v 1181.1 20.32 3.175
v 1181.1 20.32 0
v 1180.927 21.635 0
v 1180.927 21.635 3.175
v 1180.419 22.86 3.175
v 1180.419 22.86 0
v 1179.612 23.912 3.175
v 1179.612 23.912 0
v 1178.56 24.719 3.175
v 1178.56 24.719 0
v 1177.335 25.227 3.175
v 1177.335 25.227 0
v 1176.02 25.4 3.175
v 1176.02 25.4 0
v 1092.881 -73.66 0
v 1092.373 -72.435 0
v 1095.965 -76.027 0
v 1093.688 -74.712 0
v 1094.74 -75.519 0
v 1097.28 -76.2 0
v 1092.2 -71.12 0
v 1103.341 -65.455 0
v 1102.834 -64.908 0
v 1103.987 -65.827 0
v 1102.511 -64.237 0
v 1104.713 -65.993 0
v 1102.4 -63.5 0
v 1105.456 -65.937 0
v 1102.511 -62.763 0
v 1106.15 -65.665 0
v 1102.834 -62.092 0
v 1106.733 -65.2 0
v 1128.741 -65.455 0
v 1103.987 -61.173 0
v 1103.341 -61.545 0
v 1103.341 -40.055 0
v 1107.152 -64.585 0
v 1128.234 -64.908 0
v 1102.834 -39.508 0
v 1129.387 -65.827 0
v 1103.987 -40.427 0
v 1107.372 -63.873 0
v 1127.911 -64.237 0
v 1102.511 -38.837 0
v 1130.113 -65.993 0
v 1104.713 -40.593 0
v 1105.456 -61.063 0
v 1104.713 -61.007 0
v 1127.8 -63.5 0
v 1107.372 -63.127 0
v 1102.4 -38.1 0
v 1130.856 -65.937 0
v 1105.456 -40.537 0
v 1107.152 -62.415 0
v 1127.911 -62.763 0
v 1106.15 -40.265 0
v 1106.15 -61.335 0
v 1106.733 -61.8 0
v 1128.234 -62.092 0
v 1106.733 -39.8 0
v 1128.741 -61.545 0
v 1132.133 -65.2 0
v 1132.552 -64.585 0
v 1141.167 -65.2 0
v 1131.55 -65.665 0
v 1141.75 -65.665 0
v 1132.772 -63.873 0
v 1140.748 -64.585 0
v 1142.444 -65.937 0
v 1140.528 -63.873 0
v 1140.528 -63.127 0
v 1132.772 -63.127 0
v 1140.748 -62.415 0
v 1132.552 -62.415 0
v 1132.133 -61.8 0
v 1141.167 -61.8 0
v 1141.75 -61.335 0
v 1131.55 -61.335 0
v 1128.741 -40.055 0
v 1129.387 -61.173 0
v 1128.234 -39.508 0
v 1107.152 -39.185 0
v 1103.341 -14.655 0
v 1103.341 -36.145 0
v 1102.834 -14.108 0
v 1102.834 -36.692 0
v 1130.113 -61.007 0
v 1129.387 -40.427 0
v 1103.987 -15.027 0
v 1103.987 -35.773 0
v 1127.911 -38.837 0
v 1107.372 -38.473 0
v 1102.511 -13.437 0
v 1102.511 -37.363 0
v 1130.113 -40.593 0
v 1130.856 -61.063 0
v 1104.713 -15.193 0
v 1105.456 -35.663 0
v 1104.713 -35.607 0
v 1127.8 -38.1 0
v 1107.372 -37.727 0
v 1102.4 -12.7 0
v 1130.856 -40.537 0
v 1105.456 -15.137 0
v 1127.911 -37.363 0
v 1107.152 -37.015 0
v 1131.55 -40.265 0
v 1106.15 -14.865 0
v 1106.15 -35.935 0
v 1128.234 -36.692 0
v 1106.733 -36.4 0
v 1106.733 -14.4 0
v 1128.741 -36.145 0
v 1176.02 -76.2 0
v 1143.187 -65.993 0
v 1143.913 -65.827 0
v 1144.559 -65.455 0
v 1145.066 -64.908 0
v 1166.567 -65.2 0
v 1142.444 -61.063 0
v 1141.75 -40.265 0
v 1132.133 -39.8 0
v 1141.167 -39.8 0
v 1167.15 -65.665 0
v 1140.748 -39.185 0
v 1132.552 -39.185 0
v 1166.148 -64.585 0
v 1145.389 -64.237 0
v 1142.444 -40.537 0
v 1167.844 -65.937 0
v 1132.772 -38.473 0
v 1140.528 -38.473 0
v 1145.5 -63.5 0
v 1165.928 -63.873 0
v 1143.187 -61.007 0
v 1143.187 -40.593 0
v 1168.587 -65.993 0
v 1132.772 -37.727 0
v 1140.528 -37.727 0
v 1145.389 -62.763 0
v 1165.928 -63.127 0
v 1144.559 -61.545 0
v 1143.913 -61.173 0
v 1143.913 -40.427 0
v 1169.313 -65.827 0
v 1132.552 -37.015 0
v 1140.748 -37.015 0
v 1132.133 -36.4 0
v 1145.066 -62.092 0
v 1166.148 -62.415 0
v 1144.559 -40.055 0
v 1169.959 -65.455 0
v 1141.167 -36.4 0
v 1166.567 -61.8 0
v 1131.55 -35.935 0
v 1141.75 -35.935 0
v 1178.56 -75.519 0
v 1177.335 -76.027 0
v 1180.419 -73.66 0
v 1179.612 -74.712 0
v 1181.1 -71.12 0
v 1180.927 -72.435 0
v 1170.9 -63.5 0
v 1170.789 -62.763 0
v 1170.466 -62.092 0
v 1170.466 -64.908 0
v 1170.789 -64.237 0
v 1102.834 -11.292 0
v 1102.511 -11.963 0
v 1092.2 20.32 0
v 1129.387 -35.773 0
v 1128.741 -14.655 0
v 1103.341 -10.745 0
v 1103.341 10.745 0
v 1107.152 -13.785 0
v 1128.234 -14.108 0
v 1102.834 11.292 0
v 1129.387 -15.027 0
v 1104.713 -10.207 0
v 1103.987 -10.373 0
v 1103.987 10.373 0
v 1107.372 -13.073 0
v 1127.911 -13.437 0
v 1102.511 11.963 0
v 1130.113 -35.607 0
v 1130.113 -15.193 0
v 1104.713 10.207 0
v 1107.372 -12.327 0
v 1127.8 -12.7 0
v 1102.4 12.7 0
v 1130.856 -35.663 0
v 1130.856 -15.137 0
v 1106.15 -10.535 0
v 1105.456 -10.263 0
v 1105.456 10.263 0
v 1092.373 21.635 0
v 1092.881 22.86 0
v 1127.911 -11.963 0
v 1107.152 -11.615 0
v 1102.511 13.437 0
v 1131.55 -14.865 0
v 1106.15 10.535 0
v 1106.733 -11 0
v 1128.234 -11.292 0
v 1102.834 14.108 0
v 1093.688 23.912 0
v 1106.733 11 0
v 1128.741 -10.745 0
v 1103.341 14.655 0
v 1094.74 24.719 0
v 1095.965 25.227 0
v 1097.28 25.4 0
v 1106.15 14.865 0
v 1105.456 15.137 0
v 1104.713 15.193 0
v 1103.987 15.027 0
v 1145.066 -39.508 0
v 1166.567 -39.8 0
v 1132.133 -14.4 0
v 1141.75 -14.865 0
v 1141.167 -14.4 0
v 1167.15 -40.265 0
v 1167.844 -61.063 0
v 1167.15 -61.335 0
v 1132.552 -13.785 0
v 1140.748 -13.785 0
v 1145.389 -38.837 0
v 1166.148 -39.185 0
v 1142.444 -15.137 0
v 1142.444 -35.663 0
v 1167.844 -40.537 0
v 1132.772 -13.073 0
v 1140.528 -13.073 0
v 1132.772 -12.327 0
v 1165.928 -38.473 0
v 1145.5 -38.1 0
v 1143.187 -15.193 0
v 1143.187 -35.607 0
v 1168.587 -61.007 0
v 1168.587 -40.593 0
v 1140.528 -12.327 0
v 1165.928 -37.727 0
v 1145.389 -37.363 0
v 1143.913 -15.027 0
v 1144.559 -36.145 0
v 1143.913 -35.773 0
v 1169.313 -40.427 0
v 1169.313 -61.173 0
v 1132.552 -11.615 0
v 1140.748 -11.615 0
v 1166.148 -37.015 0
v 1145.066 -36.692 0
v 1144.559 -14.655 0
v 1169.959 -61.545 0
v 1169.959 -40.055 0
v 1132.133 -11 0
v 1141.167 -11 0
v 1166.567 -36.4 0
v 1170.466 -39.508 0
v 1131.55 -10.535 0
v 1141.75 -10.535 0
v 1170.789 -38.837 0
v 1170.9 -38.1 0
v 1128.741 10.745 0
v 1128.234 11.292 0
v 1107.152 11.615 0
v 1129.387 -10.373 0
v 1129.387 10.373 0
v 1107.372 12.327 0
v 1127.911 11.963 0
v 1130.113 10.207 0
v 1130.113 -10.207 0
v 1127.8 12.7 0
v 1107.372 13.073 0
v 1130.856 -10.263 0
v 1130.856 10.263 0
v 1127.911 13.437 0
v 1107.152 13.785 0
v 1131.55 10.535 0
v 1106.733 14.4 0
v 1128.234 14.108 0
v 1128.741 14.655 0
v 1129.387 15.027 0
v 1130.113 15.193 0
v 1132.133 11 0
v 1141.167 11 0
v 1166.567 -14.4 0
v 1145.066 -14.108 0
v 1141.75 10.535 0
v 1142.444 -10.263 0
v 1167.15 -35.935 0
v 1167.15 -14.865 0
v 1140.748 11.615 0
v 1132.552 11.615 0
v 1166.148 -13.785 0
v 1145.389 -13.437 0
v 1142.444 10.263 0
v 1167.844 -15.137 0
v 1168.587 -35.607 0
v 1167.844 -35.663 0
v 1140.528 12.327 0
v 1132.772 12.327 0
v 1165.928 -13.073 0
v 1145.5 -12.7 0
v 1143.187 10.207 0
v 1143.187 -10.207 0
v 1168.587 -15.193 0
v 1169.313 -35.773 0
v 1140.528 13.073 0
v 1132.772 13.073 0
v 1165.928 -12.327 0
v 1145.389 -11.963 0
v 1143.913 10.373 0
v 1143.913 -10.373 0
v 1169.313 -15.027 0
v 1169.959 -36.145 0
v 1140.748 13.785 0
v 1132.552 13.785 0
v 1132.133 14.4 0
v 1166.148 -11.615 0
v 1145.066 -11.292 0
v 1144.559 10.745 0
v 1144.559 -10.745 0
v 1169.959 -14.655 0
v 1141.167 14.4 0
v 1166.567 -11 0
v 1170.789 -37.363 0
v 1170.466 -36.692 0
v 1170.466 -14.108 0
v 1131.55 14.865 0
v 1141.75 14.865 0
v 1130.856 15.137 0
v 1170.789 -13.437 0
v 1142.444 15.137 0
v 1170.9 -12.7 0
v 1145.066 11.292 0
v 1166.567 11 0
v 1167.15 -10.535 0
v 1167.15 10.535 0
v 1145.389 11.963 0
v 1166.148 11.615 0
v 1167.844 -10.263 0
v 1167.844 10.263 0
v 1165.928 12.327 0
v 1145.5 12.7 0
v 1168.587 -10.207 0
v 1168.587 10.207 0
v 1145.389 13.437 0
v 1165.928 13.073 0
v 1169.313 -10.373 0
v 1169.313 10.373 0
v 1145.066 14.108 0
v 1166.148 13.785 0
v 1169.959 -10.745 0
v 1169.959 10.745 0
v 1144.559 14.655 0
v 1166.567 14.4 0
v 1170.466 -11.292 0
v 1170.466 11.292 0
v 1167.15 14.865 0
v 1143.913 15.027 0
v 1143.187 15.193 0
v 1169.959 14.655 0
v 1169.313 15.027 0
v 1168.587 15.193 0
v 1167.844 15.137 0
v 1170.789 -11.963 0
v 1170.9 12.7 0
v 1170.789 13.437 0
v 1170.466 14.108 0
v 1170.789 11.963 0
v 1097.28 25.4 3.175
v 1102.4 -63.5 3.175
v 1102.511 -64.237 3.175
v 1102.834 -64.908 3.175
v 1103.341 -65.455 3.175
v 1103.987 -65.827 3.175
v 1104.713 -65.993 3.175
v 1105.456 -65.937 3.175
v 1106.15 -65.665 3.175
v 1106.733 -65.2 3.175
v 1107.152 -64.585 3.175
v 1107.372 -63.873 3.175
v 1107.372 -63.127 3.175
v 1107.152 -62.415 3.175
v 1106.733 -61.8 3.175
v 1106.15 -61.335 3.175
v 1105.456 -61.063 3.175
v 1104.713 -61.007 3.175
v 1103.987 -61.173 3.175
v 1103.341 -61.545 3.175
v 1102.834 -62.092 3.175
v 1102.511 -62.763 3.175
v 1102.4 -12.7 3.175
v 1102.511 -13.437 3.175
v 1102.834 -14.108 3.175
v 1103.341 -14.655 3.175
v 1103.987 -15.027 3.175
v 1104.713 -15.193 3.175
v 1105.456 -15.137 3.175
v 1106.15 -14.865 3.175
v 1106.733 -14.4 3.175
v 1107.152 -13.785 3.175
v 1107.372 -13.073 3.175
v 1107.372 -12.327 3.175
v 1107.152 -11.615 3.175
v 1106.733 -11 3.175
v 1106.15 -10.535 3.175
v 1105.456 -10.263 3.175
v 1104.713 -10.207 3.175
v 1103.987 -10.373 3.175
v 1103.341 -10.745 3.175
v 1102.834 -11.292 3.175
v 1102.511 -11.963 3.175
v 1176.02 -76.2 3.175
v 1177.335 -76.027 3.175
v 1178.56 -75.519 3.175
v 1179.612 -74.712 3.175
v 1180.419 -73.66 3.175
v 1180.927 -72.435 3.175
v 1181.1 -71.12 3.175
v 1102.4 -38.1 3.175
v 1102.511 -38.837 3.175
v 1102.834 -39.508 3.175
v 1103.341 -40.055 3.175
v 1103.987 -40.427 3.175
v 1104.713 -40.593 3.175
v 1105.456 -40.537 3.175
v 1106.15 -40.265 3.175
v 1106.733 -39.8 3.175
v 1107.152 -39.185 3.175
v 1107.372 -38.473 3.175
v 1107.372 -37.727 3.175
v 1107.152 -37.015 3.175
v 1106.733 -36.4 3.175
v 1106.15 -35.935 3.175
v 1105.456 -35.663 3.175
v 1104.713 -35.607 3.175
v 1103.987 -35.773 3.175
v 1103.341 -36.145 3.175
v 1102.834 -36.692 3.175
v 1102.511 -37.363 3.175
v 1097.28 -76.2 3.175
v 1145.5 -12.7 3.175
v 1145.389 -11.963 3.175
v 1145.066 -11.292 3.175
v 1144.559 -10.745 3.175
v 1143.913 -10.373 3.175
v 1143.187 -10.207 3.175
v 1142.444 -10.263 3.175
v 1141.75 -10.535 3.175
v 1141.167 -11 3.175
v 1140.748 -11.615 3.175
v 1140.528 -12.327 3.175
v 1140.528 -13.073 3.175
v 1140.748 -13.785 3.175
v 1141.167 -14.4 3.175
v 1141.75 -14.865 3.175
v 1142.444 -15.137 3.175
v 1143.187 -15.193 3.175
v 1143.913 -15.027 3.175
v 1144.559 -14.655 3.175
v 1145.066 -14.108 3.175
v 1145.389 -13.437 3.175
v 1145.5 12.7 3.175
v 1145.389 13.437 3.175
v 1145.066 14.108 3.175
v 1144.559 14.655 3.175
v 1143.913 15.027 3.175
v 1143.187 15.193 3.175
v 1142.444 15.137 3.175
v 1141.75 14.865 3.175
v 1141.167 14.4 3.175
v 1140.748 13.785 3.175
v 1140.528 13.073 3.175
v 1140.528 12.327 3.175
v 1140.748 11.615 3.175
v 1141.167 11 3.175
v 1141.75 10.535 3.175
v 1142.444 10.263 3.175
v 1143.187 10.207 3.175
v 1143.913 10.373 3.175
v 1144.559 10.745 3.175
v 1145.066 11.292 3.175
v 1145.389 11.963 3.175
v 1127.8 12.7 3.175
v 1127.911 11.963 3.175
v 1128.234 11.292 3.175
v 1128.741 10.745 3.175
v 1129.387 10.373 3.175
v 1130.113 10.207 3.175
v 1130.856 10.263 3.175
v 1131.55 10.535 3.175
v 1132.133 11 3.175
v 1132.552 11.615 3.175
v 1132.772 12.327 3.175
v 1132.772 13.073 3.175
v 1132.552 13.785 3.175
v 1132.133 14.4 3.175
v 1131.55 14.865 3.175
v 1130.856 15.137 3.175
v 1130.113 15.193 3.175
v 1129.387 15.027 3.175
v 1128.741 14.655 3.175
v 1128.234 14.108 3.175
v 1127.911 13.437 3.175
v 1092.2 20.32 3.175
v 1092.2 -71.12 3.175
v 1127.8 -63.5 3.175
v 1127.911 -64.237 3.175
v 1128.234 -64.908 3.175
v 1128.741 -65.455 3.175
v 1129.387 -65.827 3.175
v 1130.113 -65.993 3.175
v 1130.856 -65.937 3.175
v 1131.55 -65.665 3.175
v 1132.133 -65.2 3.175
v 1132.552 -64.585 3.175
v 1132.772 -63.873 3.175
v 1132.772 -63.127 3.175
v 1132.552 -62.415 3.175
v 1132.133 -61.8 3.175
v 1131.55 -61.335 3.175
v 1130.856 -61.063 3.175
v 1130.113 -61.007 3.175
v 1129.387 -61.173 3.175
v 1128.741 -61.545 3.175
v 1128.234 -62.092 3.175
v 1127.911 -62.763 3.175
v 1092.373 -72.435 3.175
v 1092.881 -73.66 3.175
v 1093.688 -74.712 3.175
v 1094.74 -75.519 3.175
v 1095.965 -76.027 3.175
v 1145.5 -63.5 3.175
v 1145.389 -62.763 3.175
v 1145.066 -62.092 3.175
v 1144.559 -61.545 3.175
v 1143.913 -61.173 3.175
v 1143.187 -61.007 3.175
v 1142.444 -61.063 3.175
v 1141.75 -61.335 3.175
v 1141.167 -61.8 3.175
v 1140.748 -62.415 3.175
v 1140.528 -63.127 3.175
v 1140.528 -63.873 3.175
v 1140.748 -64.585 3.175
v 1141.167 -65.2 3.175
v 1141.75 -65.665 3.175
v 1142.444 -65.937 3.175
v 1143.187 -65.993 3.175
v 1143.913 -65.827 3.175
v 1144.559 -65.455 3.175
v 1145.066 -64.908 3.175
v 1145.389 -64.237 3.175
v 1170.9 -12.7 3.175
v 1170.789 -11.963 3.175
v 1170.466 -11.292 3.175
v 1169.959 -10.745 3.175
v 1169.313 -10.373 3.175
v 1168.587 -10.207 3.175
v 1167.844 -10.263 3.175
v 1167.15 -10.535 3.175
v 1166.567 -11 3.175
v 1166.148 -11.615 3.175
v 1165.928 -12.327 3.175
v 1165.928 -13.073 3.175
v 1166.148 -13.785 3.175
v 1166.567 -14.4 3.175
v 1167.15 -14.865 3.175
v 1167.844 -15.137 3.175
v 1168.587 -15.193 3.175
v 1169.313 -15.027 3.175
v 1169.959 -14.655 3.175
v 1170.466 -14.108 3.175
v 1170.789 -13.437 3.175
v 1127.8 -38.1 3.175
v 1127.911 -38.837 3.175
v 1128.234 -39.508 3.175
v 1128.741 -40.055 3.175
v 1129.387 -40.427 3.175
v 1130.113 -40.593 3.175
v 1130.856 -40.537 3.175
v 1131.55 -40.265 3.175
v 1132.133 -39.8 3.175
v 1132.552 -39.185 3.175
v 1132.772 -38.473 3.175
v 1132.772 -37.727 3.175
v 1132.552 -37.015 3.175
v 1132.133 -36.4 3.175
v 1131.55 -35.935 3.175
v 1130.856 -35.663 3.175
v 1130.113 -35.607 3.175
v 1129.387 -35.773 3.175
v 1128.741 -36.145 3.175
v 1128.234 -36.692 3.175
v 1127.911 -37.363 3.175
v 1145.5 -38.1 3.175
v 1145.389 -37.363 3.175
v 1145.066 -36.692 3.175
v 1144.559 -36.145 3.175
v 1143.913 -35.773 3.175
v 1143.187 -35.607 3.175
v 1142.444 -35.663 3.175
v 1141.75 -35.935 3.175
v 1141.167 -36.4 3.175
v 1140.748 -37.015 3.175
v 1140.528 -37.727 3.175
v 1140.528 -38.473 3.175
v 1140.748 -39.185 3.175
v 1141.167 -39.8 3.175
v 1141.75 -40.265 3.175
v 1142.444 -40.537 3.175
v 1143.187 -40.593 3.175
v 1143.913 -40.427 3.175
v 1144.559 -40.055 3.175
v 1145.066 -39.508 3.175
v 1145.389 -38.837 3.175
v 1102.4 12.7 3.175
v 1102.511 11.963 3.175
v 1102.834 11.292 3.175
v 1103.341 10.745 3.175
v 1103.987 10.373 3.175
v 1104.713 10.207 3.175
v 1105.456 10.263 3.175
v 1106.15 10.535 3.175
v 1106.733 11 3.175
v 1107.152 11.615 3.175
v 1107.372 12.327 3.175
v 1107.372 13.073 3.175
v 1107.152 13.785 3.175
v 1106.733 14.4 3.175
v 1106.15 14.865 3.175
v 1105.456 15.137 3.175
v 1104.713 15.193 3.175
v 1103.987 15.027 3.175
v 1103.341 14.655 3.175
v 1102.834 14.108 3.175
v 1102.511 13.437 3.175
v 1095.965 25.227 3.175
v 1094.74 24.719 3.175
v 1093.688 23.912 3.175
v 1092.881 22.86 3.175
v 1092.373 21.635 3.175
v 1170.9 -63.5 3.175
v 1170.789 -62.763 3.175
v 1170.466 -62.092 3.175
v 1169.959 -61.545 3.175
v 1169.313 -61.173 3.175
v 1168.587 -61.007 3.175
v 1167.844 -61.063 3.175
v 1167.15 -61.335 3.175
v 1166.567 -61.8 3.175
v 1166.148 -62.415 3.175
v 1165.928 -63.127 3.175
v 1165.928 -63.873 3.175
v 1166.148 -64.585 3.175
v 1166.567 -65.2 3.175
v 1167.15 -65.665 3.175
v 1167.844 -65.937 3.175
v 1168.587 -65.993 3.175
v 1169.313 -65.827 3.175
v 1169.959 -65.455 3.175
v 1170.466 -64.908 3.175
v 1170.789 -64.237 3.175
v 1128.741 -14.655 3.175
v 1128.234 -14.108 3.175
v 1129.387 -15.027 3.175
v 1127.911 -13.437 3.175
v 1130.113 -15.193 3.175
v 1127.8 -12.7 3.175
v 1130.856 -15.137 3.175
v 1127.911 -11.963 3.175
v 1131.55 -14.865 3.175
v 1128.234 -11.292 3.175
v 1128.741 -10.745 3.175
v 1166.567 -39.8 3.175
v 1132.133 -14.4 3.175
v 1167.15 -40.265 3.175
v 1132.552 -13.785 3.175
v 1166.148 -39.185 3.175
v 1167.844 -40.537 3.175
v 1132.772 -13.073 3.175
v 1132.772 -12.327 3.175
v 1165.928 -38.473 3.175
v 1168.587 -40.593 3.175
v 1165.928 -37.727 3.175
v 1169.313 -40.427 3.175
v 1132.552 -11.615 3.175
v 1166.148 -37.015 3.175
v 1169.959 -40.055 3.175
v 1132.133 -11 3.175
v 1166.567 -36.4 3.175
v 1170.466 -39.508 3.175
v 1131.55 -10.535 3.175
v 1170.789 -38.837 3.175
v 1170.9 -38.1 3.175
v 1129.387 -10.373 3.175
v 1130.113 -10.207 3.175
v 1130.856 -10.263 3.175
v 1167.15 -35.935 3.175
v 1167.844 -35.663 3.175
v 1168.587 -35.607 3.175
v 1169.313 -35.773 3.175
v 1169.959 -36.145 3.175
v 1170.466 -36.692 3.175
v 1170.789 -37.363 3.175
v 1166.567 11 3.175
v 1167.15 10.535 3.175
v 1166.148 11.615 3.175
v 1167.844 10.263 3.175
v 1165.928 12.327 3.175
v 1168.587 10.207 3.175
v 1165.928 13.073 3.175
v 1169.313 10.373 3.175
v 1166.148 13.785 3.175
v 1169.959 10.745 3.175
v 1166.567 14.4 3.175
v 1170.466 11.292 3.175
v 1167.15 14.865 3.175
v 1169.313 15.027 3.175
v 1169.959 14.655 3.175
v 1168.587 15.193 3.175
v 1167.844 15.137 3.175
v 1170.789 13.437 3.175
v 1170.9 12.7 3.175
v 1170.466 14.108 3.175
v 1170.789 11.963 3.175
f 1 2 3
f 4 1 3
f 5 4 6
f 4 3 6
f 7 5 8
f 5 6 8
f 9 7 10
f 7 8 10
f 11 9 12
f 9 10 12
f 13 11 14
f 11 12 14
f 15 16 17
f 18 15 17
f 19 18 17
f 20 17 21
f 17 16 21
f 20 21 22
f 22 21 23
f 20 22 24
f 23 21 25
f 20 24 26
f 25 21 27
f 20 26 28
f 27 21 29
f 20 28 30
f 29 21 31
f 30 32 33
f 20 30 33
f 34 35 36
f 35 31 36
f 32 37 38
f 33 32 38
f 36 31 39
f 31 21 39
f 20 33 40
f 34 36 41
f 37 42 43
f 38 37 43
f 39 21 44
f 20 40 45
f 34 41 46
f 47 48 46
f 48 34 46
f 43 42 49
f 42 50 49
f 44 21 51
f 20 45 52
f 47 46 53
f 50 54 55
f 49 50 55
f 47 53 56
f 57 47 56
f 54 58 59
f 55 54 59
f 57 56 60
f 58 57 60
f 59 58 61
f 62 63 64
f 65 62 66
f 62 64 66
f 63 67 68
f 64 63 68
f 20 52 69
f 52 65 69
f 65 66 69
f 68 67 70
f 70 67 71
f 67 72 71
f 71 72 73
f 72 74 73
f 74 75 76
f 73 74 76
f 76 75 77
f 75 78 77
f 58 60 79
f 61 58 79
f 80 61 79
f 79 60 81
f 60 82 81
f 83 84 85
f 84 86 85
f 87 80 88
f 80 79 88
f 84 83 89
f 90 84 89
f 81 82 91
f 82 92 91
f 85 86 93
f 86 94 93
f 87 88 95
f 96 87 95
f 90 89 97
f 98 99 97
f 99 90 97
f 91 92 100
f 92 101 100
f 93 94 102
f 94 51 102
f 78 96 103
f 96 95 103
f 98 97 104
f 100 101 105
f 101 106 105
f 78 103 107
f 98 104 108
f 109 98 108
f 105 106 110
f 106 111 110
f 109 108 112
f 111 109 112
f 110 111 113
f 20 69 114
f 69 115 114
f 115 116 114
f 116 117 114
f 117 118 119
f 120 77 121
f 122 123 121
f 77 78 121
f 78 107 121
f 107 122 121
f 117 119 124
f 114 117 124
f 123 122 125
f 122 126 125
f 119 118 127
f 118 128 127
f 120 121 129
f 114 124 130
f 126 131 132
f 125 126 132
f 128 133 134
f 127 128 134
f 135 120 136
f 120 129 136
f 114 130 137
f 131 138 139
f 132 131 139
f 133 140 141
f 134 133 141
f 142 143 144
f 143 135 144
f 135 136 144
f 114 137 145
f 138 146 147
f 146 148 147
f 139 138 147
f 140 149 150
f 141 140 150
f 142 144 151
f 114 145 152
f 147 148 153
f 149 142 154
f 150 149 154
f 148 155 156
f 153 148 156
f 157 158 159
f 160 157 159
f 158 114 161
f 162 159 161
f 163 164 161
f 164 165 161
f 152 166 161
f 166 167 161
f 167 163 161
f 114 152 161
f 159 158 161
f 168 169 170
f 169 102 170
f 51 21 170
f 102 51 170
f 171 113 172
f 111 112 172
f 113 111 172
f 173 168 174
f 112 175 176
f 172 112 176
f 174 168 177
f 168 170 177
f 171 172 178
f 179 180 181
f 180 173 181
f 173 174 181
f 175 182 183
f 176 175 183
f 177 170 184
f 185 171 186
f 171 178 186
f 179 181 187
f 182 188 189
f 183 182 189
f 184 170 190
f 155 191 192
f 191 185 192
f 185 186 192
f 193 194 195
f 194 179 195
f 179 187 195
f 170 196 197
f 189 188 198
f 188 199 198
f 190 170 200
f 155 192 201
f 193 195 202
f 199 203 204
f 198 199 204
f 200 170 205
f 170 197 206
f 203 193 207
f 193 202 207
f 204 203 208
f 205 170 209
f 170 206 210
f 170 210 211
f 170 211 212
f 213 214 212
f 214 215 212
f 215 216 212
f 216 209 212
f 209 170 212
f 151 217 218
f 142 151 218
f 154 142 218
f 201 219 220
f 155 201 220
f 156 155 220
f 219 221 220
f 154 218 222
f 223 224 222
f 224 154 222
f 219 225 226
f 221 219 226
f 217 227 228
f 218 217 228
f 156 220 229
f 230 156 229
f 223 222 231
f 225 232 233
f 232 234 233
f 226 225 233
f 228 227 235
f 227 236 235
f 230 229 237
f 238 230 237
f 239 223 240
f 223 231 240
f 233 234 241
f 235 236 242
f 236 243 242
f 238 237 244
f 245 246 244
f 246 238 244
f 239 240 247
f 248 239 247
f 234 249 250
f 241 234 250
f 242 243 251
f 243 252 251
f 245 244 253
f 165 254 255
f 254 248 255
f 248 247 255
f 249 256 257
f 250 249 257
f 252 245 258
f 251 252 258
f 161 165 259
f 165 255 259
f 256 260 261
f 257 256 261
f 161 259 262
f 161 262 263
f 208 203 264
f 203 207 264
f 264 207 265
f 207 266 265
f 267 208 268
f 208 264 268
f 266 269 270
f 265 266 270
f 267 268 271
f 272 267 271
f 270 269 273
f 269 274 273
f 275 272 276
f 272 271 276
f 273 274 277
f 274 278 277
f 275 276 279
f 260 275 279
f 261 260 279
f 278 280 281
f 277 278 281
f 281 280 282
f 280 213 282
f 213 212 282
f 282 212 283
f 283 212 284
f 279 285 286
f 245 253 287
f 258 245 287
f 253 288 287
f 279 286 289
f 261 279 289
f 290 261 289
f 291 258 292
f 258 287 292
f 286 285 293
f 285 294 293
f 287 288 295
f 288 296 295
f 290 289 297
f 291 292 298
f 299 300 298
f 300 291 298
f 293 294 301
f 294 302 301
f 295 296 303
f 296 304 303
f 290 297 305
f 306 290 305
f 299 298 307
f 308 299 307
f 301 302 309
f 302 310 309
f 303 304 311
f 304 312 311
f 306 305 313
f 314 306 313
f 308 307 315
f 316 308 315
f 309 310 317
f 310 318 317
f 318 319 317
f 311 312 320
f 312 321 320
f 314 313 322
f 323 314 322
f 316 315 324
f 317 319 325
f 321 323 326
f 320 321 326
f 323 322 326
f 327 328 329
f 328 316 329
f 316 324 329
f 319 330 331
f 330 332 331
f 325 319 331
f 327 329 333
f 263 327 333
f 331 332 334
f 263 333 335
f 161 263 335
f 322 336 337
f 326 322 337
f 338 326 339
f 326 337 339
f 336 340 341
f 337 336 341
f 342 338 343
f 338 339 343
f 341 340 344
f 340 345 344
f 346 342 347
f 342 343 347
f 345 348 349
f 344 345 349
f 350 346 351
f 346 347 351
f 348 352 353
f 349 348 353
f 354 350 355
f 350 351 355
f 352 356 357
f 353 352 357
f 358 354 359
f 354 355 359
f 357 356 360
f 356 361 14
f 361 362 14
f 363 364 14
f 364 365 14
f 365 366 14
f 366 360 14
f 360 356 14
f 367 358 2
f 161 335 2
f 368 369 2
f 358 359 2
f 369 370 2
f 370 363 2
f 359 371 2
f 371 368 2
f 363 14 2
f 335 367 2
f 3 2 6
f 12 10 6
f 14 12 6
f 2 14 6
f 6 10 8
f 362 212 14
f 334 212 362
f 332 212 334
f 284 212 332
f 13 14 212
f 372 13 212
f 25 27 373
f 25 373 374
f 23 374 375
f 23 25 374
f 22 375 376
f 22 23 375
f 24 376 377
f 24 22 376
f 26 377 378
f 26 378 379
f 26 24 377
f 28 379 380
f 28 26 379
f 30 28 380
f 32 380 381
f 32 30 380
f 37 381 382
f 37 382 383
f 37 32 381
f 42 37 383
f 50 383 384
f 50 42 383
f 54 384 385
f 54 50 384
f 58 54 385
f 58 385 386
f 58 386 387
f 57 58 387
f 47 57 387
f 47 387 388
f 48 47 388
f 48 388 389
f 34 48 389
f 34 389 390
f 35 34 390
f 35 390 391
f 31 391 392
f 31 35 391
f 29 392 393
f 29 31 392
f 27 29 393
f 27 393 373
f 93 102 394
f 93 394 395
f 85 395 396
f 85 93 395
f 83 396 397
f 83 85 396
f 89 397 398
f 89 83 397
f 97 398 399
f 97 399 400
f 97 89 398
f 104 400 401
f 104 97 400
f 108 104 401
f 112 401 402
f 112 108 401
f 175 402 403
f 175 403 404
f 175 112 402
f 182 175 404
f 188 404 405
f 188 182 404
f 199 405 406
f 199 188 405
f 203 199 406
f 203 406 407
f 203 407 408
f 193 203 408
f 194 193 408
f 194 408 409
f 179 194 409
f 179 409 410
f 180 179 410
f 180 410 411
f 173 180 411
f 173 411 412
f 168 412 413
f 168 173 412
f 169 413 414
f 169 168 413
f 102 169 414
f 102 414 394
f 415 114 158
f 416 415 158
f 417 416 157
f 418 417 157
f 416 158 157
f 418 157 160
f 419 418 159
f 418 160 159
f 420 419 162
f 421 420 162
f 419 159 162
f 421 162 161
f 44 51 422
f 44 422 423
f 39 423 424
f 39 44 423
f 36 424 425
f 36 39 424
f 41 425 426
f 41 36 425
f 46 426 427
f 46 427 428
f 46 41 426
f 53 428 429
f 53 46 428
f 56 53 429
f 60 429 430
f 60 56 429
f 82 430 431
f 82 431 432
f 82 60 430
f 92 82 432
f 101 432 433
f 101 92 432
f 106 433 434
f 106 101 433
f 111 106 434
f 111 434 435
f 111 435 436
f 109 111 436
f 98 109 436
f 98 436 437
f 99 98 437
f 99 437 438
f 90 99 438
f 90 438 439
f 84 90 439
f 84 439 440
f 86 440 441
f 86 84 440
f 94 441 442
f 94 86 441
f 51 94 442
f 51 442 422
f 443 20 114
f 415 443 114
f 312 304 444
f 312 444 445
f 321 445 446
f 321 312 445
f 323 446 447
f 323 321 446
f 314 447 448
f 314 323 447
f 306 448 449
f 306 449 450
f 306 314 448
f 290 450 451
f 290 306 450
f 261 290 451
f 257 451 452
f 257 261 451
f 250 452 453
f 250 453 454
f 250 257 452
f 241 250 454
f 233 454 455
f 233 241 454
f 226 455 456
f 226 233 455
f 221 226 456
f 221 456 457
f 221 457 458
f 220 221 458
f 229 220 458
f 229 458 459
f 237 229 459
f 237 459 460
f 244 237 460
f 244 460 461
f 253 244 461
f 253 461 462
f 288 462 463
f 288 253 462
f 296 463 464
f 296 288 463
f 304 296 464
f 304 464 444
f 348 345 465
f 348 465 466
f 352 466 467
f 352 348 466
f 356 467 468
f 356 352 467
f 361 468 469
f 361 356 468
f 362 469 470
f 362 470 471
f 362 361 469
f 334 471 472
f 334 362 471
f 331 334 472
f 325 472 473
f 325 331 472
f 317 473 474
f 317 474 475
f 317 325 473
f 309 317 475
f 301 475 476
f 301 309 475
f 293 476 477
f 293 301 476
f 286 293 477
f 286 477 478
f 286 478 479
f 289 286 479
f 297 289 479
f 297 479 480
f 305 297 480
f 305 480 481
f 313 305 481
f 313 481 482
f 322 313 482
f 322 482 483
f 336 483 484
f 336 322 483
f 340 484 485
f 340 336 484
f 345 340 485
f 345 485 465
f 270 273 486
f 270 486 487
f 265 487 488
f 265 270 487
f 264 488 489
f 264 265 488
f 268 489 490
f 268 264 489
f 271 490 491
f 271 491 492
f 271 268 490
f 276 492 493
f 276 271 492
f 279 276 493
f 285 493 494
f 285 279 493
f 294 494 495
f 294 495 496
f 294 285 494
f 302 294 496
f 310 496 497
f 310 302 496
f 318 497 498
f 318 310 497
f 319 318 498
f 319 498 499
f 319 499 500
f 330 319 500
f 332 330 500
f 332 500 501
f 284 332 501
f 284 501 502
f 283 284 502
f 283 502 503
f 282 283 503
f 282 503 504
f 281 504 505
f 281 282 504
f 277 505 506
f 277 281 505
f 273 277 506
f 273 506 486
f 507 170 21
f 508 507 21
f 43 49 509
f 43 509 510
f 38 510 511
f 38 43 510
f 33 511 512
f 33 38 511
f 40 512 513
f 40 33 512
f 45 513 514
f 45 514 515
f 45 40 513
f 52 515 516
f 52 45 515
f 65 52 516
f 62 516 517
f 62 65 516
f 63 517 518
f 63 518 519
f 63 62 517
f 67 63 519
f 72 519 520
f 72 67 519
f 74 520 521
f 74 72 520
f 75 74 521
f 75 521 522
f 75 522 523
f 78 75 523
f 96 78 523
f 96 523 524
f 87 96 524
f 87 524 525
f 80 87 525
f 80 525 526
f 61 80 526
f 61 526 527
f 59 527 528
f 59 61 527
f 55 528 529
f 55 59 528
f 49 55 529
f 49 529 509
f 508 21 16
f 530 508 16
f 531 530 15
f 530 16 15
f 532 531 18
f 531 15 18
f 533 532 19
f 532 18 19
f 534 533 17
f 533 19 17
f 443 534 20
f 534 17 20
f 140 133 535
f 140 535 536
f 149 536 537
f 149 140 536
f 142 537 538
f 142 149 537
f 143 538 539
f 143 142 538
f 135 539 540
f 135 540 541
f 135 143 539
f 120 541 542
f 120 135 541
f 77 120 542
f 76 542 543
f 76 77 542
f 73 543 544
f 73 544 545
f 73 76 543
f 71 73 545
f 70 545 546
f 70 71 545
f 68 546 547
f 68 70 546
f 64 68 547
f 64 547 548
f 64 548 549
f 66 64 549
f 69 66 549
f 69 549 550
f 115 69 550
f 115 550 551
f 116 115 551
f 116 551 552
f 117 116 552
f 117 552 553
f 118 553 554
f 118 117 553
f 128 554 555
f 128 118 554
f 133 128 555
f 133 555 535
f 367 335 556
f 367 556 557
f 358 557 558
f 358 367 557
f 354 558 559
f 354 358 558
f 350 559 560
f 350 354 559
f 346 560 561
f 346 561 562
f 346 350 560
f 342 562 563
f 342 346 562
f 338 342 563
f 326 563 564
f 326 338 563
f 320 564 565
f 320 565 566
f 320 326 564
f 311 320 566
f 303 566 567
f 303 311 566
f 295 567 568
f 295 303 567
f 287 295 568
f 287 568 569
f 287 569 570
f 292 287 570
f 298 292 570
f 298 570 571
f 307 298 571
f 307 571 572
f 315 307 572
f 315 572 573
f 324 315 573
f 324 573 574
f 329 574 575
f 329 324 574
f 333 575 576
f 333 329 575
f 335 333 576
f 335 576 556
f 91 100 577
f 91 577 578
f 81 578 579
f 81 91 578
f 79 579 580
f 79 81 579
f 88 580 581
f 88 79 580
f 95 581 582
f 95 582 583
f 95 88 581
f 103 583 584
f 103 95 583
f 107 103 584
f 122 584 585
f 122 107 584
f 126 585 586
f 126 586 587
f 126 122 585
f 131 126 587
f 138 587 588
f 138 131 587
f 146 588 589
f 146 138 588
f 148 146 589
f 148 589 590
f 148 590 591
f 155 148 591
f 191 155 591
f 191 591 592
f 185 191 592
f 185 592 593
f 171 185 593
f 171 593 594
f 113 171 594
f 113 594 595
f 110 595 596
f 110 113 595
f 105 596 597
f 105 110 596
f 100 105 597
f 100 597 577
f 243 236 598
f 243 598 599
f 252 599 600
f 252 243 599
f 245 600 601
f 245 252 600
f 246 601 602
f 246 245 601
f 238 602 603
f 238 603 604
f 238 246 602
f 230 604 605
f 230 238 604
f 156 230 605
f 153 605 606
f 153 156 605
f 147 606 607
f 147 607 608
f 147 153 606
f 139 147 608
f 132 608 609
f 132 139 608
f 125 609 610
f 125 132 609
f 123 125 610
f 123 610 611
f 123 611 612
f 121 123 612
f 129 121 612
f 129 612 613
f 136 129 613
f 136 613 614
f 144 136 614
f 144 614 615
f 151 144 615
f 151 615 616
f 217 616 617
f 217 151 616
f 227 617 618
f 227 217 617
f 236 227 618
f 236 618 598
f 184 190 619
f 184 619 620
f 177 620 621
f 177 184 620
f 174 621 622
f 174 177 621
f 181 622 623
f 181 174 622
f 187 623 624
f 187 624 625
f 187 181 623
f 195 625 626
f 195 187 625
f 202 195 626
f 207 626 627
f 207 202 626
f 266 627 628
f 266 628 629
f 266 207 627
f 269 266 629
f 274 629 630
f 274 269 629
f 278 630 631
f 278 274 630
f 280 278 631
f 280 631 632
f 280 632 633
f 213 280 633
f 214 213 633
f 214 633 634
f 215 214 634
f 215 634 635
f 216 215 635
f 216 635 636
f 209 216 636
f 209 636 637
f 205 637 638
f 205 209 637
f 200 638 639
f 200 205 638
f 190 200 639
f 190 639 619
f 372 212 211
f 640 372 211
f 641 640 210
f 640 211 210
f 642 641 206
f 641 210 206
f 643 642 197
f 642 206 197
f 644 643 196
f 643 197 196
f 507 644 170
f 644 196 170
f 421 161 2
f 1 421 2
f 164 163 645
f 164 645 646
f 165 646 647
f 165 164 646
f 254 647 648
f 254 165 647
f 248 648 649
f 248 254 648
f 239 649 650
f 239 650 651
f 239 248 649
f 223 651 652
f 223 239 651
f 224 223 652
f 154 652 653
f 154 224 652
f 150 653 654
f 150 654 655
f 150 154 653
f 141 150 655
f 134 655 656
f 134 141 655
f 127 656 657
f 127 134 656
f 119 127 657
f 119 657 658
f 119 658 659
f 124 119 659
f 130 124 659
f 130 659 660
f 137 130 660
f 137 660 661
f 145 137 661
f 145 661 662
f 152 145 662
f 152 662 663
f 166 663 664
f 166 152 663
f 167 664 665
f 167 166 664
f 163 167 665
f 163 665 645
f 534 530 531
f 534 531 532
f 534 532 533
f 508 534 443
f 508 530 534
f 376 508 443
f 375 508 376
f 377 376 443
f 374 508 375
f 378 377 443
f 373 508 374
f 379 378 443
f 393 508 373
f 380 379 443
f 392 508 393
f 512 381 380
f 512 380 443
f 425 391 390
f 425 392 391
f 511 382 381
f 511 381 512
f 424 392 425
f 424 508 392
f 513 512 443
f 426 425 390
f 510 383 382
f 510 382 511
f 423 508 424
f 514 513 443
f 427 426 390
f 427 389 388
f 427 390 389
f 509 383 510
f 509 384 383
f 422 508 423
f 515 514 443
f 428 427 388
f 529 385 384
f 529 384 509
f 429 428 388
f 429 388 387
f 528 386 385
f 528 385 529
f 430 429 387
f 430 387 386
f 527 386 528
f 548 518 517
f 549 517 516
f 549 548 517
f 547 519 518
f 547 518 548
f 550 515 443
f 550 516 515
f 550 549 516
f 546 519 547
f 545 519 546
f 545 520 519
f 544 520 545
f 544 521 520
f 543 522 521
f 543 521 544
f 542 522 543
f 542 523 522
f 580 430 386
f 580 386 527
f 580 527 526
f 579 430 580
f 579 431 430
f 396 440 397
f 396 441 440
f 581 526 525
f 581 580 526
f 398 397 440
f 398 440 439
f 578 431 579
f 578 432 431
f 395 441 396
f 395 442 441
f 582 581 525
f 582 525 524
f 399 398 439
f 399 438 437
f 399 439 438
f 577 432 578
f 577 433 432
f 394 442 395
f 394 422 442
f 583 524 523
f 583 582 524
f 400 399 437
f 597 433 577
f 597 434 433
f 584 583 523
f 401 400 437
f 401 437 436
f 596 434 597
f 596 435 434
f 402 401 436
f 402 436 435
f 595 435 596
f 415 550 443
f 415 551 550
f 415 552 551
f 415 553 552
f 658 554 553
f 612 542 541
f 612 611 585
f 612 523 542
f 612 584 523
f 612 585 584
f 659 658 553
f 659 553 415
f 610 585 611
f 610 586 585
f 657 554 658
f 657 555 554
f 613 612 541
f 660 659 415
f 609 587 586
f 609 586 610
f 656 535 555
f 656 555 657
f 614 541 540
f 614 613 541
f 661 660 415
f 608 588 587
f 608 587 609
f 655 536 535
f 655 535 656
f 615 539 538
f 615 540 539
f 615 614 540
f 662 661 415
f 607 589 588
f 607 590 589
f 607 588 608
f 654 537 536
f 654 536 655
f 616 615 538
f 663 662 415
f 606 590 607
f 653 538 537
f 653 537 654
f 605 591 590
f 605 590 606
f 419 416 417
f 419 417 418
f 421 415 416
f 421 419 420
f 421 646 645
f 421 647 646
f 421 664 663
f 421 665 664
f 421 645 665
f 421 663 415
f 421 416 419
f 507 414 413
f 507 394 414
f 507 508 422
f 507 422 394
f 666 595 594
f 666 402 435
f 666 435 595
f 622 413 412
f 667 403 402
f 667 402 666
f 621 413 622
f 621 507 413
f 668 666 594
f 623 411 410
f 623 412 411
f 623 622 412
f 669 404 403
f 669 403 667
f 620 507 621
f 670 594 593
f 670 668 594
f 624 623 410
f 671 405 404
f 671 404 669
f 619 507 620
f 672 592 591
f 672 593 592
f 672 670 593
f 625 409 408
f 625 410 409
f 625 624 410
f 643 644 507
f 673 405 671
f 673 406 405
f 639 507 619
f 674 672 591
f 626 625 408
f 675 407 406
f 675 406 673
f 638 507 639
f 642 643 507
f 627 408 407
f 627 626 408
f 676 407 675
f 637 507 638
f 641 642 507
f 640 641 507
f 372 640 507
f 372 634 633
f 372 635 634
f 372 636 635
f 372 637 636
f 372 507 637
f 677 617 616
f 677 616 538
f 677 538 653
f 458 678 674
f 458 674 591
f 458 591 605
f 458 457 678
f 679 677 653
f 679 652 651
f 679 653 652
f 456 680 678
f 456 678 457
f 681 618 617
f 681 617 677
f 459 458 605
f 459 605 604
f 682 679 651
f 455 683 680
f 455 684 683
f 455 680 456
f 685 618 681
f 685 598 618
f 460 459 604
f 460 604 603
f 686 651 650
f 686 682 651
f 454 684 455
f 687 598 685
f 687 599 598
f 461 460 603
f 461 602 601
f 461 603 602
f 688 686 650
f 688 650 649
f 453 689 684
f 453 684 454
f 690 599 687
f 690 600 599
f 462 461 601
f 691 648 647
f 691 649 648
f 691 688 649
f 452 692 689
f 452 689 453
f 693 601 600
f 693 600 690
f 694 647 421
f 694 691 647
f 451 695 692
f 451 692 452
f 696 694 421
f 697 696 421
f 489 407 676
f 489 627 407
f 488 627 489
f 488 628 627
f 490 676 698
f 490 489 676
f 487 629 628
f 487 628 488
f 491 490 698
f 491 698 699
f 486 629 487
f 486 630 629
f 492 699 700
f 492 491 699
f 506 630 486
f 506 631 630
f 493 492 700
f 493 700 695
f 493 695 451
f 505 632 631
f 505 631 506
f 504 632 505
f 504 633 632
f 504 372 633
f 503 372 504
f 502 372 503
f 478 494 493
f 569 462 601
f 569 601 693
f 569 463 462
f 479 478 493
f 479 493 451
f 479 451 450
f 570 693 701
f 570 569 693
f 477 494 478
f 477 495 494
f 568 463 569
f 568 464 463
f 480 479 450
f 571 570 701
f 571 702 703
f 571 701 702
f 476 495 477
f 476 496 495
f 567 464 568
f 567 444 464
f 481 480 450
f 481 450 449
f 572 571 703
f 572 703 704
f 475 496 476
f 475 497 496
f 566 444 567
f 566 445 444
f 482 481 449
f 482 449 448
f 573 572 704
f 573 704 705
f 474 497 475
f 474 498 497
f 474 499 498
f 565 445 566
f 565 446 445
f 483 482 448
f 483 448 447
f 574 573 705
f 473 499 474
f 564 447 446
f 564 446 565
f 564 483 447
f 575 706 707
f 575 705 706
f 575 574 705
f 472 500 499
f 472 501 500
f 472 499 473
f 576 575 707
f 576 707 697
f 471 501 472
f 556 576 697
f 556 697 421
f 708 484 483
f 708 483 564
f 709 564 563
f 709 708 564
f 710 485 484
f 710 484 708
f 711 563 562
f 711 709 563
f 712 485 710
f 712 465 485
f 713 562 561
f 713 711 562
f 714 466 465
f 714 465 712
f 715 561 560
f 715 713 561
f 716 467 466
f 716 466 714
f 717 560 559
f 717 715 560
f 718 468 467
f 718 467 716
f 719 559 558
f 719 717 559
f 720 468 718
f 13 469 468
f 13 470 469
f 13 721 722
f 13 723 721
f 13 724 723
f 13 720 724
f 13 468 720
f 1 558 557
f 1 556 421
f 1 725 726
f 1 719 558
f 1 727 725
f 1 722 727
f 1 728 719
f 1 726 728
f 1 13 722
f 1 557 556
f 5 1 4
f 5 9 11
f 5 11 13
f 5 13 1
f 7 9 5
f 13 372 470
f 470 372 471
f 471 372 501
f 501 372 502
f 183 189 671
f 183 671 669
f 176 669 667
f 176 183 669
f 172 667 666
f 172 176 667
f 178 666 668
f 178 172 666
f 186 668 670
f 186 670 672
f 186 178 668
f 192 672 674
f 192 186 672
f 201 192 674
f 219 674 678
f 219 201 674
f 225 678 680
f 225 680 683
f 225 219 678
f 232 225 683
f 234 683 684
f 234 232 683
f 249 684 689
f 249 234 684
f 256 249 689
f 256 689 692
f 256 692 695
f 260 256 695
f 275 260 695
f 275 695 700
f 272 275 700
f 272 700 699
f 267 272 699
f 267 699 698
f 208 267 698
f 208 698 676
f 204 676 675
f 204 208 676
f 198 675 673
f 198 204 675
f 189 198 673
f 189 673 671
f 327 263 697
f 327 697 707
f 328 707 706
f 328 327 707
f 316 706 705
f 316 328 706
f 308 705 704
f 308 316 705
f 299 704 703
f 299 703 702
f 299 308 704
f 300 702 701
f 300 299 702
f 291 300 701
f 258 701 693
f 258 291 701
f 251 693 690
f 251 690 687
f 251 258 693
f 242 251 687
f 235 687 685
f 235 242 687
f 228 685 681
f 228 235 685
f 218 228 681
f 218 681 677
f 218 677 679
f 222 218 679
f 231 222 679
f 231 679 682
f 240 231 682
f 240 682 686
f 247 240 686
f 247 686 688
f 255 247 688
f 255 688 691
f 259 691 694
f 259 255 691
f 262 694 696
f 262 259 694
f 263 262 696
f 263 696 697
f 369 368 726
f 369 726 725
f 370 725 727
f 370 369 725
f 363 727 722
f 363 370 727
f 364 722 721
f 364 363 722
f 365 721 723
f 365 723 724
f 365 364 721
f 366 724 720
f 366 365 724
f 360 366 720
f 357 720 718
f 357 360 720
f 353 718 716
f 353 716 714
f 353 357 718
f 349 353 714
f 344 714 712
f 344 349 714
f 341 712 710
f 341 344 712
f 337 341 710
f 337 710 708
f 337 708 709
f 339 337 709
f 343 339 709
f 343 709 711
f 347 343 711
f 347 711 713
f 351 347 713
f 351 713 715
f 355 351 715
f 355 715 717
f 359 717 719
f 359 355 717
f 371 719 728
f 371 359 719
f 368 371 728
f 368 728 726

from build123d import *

# Parameters (mm, degrees)
SKETCH1_R           = 2.5
BOSS_EXTRUDE1_DEPTH = 3.175


with BuildPart() as part:
    # Sketch1 → Boss-Extrude1 (new body)
    with BuildSketch(Plane.XY):
        with BuildLine():
            Line((1176.02, 25.4), (1097.28, 25.4))
            ThreePointArc((1097.28, 25.4), (1093.687897552, 23.912102448), (1092.2, 20.32))
            Line((1092.2, 20.32), (1092.2, -71.12))
            ThreePointArc((1092.2, -71.12), (1093.687897552, -74.712102448), (1097.28, -76.2))
            Line((1097.28, -76.2), (1176.02, -76.2))
            ThreePointArc((1176.02, -76.2), (1179.612102448, -74.712102448), (1181.1, -71.12))
            Line((1181.1, -71.12), (1181.1, 20.32))
            ThreePointArc((1181.1, 20.32), (1179.612102448, 23.912102448), (1176.02, 25.4))
        make_face()
        with Locations((1143, 12.7)):
            Circle(SKETCH1_R, mode=Mode.SUBTRACT)
        with Locations((1168.4, 12.7)):
            Circle(SKETCH1_R, mode=Mode.SUBTRACT)
        with Locations((1168.4, -12.7)):
            Circle(SKETCH1_R, mode=Mode.SUBTRACT)
        with Locations((1168.4, -38.1)):
            Circle(SKETCH1_R, mode=Mode.SUBTRACT)
        with Locations((1168.4, -63.5)):
            Circle(SKETCH1_R, mode=Mode.SUBTRACT)
        with Locations((1143, -12.7)):
            Circle(SKETCH1_R, mode=Mode.SUBTRACT)
        with Locations((1143, -38.1)):
            Circle(SKETCH1_R, mode=Mode.SUBTRACT)
        with Locations((1143, -63.5)):
            Circle(SKETCH1_R, mode=Mode.SUBTRACT)
        with Locations(Location((1104.9, 12.7, 0), (0, 0, 180))):
            Circle(SKETCH1_R, mode=Mode.SUBTRACT)
        with Locations(Location((1104.9, -12.7, 0), (0, 0, 180))):
            Circle(SKETCH1_R, mode=Mode.SUBTRACT)
        with Locations(Location((1104.9, -38.1, 0), (0, 0, 180))):
            Circle(SKETCH1_R, mode=Mode.SUBTRACT)
        with Locations(Location((1104.9, -63.5, 0), (0, 0, 180))):
            Circle(SKETCH1_R, mode=Mode.SUBTRACT)
        with Locations(Location((1130.3, -63.5, 0), (0, 0, 180))):
            Circle(SKETCH1_R, mode=Mode.SUBTRACT)
        with Locations(Location((1130.3, -38.1, 0), (0, 0, 180))):
            Circle(SKETCH1_R, mode=Mode.SUBTRACT)
        with Locations(Location((1130.3, -12.7, 0), (0, 0, 180))):
            Circle(SKETCH1_R, mode=Mode.SUBTRACT)
        with Locations(Location((1130.3, 12.7, 0), (0, 0, 180))):
            Circle(SKETCH1_R, mode=Mode.SUBTRACT)
    extrude(amount=BOSS_EXTRUDE1_DEPTH)


solid = part.part
